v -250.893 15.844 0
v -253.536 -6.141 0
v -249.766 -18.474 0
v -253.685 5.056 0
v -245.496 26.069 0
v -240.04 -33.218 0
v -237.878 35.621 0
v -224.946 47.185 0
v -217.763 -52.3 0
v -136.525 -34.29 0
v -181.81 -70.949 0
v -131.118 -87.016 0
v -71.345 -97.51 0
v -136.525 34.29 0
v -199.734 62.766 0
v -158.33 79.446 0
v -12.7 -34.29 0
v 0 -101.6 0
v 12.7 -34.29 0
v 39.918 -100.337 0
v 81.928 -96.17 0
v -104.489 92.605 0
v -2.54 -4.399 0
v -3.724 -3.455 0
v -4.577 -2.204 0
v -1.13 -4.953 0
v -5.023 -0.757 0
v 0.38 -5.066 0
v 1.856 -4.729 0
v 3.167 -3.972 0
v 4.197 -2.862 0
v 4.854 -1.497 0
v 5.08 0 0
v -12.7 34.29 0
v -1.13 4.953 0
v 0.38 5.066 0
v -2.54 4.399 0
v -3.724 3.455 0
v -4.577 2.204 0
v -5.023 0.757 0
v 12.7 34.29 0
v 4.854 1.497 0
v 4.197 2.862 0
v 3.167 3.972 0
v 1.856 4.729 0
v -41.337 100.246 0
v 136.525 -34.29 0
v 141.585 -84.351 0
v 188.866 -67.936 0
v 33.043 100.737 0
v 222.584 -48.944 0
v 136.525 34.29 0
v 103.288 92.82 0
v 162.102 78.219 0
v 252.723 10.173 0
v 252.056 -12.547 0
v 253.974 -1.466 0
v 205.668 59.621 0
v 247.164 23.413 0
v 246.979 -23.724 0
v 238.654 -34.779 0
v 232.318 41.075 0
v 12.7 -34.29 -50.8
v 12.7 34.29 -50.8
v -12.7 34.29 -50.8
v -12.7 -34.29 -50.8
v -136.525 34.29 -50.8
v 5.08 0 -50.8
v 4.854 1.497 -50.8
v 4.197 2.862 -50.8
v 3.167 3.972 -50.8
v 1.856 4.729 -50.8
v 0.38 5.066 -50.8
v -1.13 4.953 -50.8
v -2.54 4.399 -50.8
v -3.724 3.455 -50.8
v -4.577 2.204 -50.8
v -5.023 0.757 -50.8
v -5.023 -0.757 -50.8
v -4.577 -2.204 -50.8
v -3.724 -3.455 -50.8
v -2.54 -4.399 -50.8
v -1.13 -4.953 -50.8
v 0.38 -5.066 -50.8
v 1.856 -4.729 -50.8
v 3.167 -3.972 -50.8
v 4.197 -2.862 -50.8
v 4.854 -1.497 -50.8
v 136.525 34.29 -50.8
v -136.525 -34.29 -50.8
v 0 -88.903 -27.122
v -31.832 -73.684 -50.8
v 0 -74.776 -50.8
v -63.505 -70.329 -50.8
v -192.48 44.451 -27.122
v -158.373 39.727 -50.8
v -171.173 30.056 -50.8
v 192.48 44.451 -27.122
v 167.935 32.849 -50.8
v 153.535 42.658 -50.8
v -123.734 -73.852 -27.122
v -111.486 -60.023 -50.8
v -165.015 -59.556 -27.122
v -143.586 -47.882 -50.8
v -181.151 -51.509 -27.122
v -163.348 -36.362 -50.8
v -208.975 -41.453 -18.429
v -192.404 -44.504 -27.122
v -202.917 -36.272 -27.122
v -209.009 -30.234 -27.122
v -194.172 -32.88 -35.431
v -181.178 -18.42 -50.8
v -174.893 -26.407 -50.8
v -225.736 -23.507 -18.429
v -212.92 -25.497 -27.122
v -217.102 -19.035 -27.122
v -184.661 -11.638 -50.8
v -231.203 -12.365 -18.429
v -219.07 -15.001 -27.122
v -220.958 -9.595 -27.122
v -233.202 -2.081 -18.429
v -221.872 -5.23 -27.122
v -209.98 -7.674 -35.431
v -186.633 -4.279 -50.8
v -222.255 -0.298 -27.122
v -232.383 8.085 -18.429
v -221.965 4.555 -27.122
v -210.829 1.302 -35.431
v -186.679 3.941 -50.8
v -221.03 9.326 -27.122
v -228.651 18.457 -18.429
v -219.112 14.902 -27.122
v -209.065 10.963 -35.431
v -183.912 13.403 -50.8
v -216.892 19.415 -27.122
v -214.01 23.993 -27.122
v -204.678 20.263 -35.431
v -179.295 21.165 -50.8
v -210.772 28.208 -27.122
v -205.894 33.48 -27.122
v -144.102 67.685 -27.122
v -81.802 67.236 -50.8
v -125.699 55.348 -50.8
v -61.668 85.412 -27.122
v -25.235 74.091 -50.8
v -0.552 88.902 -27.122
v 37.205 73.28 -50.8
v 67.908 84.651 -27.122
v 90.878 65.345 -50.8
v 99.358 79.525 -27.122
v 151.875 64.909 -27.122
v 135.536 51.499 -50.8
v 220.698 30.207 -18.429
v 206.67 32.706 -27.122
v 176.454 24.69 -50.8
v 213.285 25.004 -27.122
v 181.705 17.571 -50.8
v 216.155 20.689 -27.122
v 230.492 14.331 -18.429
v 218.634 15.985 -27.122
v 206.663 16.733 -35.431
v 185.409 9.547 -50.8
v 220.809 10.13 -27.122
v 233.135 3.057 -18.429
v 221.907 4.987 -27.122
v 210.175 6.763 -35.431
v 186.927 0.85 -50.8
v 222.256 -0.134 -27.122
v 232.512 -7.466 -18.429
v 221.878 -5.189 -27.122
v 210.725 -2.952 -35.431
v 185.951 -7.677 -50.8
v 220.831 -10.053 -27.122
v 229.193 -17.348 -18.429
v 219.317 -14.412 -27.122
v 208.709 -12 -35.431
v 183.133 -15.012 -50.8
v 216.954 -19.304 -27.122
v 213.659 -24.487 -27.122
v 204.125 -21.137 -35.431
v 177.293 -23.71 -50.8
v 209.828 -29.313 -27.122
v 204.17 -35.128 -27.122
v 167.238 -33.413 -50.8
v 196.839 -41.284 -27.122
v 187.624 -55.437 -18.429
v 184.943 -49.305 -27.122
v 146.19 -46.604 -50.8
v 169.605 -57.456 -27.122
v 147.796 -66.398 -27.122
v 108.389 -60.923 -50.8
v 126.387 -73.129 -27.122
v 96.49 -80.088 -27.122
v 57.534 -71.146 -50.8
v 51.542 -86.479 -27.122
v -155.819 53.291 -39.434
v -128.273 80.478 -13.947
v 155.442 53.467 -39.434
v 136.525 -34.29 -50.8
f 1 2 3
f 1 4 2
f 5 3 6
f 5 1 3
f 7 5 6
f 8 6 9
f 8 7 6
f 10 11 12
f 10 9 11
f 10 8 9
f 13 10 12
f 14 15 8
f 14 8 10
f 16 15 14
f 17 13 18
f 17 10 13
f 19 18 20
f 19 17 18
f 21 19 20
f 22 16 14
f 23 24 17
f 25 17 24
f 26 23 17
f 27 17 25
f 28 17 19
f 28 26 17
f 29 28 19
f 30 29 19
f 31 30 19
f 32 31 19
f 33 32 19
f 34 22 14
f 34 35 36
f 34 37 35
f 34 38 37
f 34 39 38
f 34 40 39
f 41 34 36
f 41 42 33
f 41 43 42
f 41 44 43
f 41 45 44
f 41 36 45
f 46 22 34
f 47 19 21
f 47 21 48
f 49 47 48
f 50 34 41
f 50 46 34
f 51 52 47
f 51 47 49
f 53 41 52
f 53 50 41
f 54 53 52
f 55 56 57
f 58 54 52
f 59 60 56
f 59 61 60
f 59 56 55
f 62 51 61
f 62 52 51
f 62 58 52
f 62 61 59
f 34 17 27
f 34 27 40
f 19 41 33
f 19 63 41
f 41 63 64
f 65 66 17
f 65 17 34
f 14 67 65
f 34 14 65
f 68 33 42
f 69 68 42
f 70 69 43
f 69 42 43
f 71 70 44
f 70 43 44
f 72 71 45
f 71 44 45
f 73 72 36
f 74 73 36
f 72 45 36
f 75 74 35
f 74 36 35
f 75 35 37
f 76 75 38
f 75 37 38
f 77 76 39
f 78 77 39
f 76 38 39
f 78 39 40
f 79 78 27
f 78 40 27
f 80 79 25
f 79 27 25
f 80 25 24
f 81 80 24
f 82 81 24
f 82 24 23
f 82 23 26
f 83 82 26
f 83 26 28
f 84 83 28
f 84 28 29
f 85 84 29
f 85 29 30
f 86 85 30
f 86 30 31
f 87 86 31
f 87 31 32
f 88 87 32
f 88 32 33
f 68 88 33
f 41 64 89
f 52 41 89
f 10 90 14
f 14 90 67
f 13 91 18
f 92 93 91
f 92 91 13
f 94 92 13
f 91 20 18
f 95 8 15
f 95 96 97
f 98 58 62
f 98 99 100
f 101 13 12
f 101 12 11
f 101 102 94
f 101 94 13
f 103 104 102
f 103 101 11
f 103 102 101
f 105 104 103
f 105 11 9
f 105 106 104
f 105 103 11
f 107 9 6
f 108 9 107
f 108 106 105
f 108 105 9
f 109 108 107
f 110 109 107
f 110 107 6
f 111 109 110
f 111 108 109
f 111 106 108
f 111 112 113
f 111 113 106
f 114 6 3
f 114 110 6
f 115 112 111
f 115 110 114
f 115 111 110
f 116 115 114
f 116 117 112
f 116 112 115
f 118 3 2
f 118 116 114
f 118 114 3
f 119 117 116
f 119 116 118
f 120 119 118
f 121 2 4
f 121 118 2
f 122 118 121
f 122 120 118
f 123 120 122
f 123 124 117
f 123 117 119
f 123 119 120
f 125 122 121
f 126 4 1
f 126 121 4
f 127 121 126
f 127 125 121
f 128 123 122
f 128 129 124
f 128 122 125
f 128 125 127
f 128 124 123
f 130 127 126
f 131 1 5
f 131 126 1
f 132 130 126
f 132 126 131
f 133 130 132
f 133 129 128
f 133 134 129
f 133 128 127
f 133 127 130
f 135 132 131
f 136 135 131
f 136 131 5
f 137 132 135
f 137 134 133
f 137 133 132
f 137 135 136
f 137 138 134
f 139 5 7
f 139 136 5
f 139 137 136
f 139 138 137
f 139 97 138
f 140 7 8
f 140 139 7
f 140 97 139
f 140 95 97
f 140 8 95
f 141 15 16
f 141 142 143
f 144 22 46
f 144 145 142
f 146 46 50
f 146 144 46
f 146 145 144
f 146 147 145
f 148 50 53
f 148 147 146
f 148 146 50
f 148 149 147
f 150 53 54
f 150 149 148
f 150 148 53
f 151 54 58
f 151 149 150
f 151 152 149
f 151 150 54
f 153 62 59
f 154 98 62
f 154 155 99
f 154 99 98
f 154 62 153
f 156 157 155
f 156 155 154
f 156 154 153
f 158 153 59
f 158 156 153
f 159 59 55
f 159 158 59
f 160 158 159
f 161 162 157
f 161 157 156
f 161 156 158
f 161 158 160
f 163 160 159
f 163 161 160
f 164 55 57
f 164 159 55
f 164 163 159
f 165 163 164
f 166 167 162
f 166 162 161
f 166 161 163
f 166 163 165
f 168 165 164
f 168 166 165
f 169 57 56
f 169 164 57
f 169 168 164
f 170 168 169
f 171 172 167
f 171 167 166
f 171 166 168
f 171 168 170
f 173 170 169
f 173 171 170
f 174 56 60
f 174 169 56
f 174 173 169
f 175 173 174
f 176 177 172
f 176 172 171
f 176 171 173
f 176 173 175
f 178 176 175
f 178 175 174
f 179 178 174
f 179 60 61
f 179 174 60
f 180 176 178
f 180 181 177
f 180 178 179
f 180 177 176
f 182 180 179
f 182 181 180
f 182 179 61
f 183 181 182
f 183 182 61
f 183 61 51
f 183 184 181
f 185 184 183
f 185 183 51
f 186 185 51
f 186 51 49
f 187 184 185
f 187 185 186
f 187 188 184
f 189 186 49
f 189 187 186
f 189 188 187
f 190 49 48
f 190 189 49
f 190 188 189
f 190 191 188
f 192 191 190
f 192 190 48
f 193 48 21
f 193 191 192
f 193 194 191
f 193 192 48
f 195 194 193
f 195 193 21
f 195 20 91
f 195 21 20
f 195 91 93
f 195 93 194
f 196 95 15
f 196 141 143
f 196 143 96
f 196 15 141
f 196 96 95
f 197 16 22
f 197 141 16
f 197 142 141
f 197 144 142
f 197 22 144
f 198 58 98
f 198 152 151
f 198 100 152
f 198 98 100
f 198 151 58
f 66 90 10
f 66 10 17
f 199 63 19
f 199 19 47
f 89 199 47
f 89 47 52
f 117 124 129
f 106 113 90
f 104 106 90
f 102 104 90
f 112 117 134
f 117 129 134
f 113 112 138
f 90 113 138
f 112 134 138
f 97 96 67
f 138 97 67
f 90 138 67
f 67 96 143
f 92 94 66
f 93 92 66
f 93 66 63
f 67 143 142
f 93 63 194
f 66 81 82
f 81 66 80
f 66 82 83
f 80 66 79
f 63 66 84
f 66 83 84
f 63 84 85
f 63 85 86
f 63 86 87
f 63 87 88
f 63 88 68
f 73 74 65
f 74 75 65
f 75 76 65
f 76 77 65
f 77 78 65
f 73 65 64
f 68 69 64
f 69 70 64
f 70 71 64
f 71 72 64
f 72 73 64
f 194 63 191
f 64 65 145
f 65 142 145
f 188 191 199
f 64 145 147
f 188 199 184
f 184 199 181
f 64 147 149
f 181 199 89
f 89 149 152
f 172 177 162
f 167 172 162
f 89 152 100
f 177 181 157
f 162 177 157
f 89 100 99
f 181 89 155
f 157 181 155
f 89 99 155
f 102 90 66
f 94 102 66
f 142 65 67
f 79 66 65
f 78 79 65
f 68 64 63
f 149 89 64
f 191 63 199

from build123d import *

# Parameters (mm, degrees)
BEAM_SCALE_X           = 1
BEAM_SCALE_Y           = 4
BEAM_SCALE_Z           = 1
LENGTH_SCALE_X         = 10
LENGTH_SCALE_Y         = 1
LENGTH_SCALE_Z         = 1
PAYLOAD_BAY_DEPTH      = 292.823782601
PAYLOAD_BAY_DEPTH_BACK = 63.5
SKETCH6_W              = 123.825
SKETCH6_H              = 68.58
MAST_HOLE_DEPTH        = 292.823782601
MAST_HOLE_DEPTH_BACK   = 101.6
SKETCH16_R             = 5.08
SKETCH15_2_W           = 508
SKETCH15_2_H           = 203.2
LAYER_2_DEPTH          = 50.8


with BuildPart() as part:
    # YZ Section_depthOnly → Depth (revolve)
    with BuildSketch(Plane(origin=(0, 0, 0), x_dir=(0, 0, -1), z_dir=(1, 0, 0))):
        with BuildLine():
            Line((0, 0), (0, -25.4))
            add(Edge.make_bspline(
                [(0, -25.4), (101.6, -14.816666667), (101.6, 0)],
                knots=[5.507991934, 5.507991934, 5.507991934, 6.283185307, 6.283185307, 6.283185307], degree=2, weights=[1, 0.9258201, 1]))
            Line((101.6, 0), (0, 0))
        make_face()
    revolve(axis=Axis((0, 0, 254), (0, 0, -1)))

    # Sketch13 → Height (revolve)
    with BuildSketch(Plane(origin=(0, 0, 0), x_dir=(0, 0, -1), z_dir=(1, 0, 0))):
        with BuildLine():
            Line((0, 0), (-50.8, 0))
            add(Edge.make_bspline(
                [(-50.8, 0), (-50.8, -23.988888889), (0, -25.4)],
                knots=[0, 0, 0, 1.511938821, 1.511938821, 1.511938821], degree=2, weights=[1, 0.727606875, 1]))
            Line((0, -25.4), (0, 0))
        make_face()
    revolve(axis=Axis((0, 0, 0), (0, 0, 1)))


with BuildPart() as part_1:
    # Beam: scaled about (0, 0, 0)
    add(part.part.scale((BEAM_SCALE_X, BEAM_SCALE_Y, BEAM_SCALE_Z), about=(0, 0, 0)))


with BuildPart() as part_2:
    # Length: scaled about (0, 0, 0)
    add(part_1.part.scale((LENGTH_SCALE_X, LENGTH_SCALE_Y, LENGTH_SCALE_Z), about=(0, 0, 0)))

    # Sketch6 → Payload Bay (cut, two sides: drawn at the far end of the back side and taken through both)
    with BuildSketch(Plane.XY.offset(-PAYLOAD_BAY_DEPTH_BACK)):
        with Locations((-74.6125, 0)):
            Rectangle(SKETCH6_W, SKETCH6_H)
        with Locations((74.6125, 0)):
            Rectangle(SKETCH6_W, SKETCH6_H)
    extrude(amount=PAYLOAD_BAY_DEPTH + PAYLOAD_BAY_DEPTH_BACK, mode=Mode.SUBTRACT)

    # Sketch16 → Mast Hole (cut, two sides: drawn at the far end of the back side and taken through both)
    with BuildSketch(Plane.XY.offset(-MAST_HOLE_DEPTH_BACK)):
        Circle(SKETCH16_R)
    extrude(amount=MAST_HOLE_DEPTH + MAST_HOLE_DEPTH_BACK, mode=Mode.SUBTRACT)


with BuildPart() as body_2:
    # Sketch15_2 → Layer 2 (new body)
    with BuildSketch(Plane.XY):
        Rectangle(SKETCH15_2_W, SKETCH15_2_H)
    extrude(amount=-LAYER_2_DEPTH)


with BuildPart() as part_3:
    add(part_2.part)

    # Layer 2 Body: intersect body 2
    add(body_2.part, mode=Mode.INTERSECT)


solid = part_3.part
